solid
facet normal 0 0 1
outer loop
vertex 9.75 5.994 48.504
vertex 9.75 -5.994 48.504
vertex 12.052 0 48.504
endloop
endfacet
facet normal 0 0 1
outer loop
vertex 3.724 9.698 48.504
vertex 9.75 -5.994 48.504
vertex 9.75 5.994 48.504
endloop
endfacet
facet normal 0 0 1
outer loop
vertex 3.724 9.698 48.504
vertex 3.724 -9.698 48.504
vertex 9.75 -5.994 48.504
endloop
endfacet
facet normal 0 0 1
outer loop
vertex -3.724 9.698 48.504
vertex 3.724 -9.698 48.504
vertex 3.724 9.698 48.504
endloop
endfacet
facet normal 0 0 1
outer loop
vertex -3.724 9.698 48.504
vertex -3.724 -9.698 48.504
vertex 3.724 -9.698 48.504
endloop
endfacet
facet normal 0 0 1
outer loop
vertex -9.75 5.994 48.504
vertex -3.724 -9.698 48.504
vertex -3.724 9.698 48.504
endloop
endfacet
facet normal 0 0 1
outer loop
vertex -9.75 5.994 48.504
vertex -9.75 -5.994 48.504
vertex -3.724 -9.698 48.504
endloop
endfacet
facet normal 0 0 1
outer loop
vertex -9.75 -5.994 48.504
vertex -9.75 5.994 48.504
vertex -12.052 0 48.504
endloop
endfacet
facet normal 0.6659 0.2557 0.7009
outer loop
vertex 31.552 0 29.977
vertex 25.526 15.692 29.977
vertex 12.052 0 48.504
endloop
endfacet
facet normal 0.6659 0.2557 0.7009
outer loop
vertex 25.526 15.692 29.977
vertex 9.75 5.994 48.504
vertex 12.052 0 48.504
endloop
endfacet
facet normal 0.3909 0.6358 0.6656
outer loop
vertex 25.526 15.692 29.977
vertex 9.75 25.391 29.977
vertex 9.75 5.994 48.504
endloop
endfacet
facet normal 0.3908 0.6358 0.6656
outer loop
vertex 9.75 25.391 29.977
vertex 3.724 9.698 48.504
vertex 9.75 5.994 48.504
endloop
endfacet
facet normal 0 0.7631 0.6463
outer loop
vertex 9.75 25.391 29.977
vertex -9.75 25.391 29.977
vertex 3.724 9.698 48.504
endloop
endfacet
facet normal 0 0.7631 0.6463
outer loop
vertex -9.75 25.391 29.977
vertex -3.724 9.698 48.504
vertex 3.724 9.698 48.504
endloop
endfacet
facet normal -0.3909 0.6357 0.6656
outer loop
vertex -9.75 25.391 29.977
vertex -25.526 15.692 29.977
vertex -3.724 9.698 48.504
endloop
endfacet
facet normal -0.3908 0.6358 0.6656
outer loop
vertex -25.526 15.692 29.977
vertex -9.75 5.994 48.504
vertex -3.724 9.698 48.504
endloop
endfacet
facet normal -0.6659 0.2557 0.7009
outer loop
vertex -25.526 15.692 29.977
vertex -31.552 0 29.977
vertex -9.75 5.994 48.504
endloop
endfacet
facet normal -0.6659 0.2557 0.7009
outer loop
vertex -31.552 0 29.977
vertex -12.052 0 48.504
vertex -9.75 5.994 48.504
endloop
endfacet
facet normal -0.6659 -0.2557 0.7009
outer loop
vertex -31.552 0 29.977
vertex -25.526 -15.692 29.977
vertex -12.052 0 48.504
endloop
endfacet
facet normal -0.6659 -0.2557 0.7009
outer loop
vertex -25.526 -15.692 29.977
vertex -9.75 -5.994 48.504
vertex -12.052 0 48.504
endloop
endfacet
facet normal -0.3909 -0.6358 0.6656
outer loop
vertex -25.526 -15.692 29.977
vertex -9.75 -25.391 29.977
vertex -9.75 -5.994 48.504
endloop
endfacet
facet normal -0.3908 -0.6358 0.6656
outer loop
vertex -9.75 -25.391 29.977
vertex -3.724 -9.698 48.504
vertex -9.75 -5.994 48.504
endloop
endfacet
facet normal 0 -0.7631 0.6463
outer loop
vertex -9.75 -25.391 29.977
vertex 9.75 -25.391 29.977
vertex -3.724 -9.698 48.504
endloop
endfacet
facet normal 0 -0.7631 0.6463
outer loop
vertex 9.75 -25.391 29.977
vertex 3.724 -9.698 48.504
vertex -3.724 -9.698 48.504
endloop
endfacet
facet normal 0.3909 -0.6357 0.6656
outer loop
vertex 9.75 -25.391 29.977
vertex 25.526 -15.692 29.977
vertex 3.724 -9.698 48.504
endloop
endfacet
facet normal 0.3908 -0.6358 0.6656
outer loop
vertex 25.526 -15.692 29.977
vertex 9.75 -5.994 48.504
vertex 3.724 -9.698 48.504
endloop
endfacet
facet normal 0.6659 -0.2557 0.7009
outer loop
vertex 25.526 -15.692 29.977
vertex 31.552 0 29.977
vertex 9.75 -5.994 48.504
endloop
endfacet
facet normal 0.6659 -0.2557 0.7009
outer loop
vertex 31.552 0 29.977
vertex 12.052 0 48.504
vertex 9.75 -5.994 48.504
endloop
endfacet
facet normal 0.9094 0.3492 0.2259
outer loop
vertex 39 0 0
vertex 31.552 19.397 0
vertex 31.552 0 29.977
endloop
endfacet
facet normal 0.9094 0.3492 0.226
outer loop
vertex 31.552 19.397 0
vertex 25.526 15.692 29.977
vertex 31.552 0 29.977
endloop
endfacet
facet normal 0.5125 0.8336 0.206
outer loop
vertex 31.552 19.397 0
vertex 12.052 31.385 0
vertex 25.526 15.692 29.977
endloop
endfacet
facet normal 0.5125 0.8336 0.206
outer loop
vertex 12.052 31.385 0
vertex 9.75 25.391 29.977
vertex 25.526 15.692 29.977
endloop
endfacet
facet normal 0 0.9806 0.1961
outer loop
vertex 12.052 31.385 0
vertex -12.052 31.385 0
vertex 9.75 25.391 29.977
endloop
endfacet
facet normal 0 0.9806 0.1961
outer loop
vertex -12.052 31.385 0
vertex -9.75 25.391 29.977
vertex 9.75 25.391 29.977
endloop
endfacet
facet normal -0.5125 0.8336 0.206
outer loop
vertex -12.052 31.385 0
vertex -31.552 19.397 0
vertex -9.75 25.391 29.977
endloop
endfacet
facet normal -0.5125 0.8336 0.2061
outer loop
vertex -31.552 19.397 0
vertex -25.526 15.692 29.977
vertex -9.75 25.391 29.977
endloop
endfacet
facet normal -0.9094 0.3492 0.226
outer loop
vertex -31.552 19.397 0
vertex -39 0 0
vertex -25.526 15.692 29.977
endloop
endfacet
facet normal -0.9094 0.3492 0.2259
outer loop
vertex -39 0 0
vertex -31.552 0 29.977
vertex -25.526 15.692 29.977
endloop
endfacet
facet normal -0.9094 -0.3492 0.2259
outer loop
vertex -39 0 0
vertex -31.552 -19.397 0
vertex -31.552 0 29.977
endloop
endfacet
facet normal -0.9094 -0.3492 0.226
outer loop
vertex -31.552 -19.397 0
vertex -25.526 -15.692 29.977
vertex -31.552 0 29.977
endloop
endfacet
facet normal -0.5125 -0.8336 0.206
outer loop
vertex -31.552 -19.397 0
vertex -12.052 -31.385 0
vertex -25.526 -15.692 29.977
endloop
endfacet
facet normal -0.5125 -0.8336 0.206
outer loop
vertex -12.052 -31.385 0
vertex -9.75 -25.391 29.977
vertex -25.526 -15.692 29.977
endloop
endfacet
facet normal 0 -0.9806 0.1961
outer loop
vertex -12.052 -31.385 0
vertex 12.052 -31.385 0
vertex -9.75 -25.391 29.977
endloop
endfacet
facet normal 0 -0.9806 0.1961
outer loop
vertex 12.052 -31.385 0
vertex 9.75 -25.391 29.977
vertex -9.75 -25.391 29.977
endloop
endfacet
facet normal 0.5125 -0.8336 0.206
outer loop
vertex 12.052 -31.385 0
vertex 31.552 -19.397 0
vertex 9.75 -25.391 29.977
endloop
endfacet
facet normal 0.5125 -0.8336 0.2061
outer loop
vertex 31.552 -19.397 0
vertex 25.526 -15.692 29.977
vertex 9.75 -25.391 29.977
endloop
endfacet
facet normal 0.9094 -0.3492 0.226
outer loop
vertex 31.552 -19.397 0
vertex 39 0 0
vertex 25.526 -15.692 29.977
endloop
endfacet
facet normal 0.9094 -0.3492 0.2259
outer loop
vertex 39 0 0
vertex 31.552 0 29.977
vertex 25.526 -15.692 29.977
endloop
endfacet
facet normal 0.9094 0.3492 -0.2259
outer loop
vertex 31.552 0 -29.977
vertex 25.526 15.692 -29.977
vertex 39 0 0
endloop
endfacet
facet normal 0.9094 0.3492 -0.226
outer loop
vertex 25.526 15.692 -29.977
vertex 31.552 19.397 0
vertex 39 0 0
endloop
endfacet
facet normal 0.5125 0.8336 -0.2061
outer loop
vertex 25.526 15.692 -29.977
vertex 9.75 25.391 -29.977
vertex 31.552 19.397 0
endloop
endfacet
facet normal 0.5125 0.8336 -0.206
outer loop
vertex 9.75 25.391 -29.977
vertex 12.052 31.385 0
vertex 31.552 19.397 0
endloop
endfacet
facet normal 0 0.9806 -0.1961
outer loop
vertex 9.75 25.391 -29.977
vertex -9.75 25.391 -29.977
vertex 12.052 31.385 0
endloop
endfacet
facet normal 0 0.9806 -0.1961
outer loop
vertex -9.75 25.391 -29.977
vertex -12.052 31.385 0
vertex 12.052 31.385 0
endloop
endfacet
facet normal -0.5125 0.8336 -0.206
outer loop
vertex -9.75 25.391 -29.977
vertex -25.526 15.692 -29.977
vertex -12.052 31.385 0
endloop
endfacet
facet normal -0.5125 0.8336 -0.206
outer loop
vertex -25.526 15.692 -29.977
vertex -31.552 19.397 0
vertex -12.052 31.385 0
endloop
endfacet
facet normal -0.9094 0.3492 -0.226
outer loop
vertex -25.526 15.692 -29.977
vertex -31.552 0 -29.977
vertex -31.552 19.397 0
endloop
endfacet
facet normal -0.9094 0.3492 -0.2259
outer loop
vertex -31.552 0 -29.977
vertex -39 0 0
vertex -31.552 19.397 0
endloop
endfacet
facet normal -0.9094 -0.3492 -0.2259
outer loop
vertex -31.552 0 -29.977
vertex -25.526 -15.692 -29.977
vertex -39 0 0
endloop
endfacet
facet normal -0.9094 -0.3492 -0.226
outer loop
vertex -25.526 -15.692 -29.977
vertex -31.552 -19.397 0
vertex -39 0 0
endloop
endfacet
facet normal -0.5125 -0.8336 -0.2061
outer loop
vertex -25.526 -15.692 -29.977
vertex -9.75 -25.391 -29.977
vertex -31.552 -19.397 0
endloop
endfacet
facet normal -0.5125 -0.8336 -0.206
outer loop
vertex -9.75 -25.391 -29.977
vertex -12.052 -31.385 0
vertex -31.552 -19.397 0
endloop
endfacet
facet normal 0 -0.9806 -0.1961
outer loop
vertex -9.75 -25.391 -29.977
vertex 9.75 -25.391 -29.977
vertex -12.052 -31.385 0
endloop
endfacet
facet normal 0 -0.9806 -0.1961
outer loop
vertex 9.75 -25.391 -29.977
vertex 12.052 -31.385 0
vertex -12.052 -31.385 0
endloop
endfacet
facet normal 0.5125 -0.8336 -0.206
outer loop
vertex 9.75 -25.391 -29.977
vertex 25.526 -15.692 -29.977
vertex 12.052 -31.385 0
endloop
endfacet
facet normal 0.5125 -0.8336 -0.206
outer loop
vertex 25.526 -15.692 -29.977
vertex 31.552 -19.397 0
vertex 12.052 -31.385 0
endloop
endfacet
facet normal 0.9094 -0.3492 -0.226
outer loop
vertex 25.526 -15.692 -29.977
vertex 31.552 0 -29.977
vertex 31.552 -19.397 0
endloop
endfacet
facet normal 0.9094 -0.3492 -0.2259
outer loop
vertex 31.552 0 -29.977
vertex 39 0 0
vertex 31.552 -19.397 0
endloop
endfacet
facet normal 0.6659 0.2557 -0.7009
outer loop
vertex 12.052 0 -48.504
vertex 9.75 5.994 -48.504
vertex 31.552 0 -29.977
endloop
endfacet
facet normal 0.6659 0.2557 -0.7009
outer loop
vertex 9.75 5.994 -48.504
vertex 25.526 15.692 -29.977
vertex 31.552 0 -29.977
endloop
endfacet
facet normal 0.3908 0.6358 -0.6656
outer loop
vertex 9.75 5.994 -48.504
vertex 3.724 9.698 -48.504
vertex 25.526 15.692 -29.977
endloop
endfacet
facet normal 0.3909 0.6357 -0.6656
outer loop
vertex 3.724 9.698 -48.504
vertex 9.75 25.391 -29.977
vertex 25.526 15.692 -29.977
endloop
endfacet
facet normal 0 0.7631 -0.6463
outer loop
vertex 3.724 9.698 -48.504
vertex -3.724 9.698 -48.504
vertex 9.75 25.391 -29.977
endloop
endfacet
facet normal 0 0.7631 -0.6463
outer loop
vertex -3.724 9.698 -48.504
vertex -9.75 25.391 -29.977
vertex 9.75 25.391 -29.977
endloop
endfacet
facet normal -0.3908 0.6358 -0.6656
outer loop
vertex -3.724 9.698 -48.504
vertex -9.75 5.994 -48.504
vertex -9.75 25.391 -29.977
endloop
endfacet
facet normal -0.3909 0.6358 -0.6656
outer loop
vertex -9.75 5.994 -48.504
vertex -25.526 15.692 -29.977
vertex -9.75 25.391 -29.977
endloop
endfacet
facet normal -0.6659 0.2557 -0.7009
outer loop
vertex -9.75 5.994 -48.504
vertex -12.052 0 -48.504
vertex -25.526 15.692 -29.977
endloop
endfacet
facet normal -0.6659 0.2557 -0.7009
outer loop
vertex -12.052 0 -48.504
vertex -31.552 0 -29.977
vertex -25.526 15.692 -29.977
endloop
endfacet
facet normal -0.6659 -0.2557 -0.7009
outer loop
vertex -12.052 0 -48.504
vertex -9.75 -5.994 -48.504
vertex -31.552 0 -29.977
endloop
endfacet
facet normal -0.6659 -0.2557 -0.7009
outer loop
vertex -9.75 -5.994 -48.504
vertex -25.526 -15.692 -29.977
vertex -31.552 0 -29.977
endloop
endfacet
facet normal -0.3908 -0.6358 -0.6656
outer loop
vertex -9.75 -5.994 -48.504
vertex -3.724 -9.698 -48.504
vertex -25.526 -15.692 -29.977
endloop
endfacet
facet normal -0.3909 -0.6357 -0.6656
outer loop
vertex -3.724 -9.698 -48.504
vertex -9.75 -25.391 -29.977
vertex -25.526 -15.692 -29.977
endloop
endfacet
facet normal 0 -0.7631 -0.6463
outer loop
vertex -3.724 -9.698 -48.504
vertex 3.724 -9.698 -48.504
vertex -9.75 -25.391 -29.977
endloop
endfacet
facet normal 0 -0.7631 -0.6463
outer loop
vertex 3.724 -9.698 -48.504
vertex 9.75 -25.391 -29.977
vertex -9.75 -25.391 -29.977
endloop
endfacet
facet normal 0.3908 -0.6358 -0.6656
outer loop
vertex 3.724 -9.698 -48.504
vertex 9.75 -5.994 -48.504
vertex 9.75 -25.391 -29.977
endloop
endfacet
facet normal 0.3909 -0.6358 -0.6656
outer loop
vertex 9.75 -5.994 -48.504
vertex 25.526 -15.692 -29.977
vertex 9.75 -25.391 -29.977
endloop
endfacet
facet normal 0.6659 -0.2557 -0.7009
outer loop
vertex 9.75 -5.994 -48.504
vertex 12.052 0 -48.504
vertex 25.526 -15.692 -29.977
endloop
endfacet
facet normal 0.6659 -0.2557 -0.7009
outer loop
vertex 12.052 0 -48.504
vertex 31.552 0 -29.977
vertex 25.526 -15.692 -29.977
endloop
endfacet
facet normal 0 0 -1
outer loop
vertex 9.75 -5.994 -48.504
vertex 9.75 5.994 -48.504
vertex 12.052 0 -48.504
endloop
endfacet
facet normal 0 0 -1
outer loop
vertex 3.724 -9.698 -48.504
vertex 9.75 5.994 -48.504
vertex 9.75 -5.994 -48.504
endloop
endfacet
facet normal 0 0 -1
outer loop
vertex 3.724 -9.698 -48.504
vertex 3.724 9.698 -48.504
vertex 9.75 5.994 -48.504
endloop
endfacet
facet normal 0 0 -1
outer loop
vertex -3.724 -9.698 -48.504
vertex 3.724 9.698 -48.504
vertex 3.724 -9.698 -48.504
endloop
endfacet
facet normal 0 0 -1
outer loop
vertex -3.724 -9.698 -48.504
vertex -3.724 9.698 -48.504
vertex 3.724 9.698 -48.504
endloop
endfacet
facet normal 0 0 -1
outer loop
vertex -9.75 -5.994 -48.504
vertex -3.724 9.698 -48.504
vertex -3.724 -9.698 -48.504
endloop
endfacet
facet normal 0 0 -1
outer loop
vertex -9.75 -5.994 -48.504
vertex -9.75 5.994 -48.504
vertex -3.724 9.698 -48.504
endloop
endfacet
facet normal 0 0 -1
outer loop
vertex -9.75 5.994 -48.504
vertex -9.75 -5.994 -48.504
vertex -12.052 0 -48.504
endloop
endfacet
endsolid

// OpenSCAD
// Generated by SolidPython 1.0.1 on 2020-07-29 00:46:51


scale(v = [13, 11, 17]) {
	sphere(r = 3);
}
/***********************************************
*********      SolidPython code:      **********
************************************************
 
# import packages: SolidPython
from solid import *
from solid.utils import *
from itertools import chain, combinations, permutations


class Resize:

    def __init__(self, scad_file):
        self.scad_file = scad_file
        #self.scad_file = import_scad(scad_file)
        # cone/cylinder param:
        self.r1 = 0
        self.r2 = 0
        self.h = 0
        # rectangular prism param:
        self.w = 0
        self.l = 0
        # ellipse param:
        self.r = 0

    # import OpenScad code (file name corresponds to shape)


    # classify shape + parameters
    def assign(self, param1, param2, param3):
        if self.scad_file == 'cone.scad':
            self.r1 = param1
            self.r2 = param2
            self.h = param3
        elif self.scad_file == 'cylinder.scad':
            self.r1 = param1
            self.r2 = param2
            self.h = param3
        elif self.scad_file == 'rectangularPrism.scad':
            self.h = param1
            self.l = param2
            self.w = param3
        else:
            self.r = param1
            self.h = param2

    # resize parameters
    def iterate(self):
        x = range(3, 20, 2)
        i = 1
        if self.scad_file == 'cone.scad':
            tempList = list(permutations(x, 2))
            for temp in tempList:
                param1 = temp[0]
                param2 = temp[1]
                filepath = 'produced_scad_files/' + 'cone' + str(param1) + '_' + str(param2) + '_' + '.scad'
                scad_render_to_file(cylinder(h=param1, r1=param2, r2=0), filepath)

        elif self.scad_file == 'cylinder.scad':
            tempList = list(permutations(x, 3))
            for temp in tempList:
                param1 = temp[0]
                param2 = temp[1]
                filepath = 'produced_scad_files/' + 'cylinder' + str(param1) + '_' + str(param2) + '_' + '.scad'
                scad_render_to_file(cylinder(h=param1, r1=param2, r2=param2), filepath)

        elif self.scad_file == 'rectangularPrism.scad':
            tempList = list(permutations(x, 3))
            for temp in tempList:
                param1 = temp[0]
                param2 = temp[1]
                param3 = temp[2]
                filepath = 'produced_scad_files/' + 'rectangularPrism' + str(param1) + '_' + str(param2) + '_' + str(
                    param3) + '.scad'
                scad_render_to_file(cube(size=(param1, param2, param3)), filepath)

        elif self.scad_file == 'ellipse.scad':
            tempList = list(permutations(x, 4))
            for temp in tempList:
                param1 = temp[0]
                param2 = temp[1]
                param3 = temp[2]
                param4 = temp[3]
                filepath = 'produced_scad_files/' + 'ellipse' + str(param1) + '_' + str(param2) + '_' + str(param3) + '_' + str(param4) + '.scad'
                scad_render_to_file(scale([param1, param2, param3])(sphere(r=param4)), filepath)

    def render_to_scadfile(self):
        scad_render_to_file(scad, 'example.scad') 
 
************************************************/
